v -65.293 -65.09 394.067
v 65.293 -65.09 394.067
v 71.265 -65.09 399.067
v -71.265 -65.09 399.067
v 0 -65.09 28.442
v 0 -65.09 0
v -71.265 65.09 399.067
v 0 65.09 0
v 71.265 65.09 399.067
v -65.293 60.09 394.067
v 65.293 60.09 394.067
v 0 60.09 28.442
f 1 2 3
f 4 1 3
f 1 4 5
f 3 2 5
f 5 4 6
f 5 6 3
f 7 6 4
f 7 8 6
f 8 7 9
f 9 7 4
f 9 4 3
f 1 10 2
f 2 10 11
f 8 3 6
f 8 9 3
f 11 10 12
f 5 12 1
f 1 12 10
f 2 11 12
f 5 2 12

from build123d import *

# Parameters (mm, degrees)
MAIN_BLOCK_EXTRUDE_DEPTH = 65.09
SHELL1_T                 = -5


with BuildPart() as part:
    # Sketch1 → Main block extrude (new, symmetric)
    with BuildSketch(Plane(origin=(0, 0, 0), x_dir=(1, 0, 0), z_dir=(0, 1, 0))):
        Polygon((0, 0), (-71.265, -399.066716446), (71.265, -399.066716446), align=None)
    extrude(amount=MAIN_BLOCK_EXTRUDE_DEPTH, both=True)

    # Shell1
    shell1_openings = [part.faces().sort_by_distance(p)[0] for p in [
        (0, -65.09, 266.044477631),
    ]]
    offset(amount=SHELL1_T, openings=shell1_openings, kind=Kind.INTERSECTION)


solid = part.part
